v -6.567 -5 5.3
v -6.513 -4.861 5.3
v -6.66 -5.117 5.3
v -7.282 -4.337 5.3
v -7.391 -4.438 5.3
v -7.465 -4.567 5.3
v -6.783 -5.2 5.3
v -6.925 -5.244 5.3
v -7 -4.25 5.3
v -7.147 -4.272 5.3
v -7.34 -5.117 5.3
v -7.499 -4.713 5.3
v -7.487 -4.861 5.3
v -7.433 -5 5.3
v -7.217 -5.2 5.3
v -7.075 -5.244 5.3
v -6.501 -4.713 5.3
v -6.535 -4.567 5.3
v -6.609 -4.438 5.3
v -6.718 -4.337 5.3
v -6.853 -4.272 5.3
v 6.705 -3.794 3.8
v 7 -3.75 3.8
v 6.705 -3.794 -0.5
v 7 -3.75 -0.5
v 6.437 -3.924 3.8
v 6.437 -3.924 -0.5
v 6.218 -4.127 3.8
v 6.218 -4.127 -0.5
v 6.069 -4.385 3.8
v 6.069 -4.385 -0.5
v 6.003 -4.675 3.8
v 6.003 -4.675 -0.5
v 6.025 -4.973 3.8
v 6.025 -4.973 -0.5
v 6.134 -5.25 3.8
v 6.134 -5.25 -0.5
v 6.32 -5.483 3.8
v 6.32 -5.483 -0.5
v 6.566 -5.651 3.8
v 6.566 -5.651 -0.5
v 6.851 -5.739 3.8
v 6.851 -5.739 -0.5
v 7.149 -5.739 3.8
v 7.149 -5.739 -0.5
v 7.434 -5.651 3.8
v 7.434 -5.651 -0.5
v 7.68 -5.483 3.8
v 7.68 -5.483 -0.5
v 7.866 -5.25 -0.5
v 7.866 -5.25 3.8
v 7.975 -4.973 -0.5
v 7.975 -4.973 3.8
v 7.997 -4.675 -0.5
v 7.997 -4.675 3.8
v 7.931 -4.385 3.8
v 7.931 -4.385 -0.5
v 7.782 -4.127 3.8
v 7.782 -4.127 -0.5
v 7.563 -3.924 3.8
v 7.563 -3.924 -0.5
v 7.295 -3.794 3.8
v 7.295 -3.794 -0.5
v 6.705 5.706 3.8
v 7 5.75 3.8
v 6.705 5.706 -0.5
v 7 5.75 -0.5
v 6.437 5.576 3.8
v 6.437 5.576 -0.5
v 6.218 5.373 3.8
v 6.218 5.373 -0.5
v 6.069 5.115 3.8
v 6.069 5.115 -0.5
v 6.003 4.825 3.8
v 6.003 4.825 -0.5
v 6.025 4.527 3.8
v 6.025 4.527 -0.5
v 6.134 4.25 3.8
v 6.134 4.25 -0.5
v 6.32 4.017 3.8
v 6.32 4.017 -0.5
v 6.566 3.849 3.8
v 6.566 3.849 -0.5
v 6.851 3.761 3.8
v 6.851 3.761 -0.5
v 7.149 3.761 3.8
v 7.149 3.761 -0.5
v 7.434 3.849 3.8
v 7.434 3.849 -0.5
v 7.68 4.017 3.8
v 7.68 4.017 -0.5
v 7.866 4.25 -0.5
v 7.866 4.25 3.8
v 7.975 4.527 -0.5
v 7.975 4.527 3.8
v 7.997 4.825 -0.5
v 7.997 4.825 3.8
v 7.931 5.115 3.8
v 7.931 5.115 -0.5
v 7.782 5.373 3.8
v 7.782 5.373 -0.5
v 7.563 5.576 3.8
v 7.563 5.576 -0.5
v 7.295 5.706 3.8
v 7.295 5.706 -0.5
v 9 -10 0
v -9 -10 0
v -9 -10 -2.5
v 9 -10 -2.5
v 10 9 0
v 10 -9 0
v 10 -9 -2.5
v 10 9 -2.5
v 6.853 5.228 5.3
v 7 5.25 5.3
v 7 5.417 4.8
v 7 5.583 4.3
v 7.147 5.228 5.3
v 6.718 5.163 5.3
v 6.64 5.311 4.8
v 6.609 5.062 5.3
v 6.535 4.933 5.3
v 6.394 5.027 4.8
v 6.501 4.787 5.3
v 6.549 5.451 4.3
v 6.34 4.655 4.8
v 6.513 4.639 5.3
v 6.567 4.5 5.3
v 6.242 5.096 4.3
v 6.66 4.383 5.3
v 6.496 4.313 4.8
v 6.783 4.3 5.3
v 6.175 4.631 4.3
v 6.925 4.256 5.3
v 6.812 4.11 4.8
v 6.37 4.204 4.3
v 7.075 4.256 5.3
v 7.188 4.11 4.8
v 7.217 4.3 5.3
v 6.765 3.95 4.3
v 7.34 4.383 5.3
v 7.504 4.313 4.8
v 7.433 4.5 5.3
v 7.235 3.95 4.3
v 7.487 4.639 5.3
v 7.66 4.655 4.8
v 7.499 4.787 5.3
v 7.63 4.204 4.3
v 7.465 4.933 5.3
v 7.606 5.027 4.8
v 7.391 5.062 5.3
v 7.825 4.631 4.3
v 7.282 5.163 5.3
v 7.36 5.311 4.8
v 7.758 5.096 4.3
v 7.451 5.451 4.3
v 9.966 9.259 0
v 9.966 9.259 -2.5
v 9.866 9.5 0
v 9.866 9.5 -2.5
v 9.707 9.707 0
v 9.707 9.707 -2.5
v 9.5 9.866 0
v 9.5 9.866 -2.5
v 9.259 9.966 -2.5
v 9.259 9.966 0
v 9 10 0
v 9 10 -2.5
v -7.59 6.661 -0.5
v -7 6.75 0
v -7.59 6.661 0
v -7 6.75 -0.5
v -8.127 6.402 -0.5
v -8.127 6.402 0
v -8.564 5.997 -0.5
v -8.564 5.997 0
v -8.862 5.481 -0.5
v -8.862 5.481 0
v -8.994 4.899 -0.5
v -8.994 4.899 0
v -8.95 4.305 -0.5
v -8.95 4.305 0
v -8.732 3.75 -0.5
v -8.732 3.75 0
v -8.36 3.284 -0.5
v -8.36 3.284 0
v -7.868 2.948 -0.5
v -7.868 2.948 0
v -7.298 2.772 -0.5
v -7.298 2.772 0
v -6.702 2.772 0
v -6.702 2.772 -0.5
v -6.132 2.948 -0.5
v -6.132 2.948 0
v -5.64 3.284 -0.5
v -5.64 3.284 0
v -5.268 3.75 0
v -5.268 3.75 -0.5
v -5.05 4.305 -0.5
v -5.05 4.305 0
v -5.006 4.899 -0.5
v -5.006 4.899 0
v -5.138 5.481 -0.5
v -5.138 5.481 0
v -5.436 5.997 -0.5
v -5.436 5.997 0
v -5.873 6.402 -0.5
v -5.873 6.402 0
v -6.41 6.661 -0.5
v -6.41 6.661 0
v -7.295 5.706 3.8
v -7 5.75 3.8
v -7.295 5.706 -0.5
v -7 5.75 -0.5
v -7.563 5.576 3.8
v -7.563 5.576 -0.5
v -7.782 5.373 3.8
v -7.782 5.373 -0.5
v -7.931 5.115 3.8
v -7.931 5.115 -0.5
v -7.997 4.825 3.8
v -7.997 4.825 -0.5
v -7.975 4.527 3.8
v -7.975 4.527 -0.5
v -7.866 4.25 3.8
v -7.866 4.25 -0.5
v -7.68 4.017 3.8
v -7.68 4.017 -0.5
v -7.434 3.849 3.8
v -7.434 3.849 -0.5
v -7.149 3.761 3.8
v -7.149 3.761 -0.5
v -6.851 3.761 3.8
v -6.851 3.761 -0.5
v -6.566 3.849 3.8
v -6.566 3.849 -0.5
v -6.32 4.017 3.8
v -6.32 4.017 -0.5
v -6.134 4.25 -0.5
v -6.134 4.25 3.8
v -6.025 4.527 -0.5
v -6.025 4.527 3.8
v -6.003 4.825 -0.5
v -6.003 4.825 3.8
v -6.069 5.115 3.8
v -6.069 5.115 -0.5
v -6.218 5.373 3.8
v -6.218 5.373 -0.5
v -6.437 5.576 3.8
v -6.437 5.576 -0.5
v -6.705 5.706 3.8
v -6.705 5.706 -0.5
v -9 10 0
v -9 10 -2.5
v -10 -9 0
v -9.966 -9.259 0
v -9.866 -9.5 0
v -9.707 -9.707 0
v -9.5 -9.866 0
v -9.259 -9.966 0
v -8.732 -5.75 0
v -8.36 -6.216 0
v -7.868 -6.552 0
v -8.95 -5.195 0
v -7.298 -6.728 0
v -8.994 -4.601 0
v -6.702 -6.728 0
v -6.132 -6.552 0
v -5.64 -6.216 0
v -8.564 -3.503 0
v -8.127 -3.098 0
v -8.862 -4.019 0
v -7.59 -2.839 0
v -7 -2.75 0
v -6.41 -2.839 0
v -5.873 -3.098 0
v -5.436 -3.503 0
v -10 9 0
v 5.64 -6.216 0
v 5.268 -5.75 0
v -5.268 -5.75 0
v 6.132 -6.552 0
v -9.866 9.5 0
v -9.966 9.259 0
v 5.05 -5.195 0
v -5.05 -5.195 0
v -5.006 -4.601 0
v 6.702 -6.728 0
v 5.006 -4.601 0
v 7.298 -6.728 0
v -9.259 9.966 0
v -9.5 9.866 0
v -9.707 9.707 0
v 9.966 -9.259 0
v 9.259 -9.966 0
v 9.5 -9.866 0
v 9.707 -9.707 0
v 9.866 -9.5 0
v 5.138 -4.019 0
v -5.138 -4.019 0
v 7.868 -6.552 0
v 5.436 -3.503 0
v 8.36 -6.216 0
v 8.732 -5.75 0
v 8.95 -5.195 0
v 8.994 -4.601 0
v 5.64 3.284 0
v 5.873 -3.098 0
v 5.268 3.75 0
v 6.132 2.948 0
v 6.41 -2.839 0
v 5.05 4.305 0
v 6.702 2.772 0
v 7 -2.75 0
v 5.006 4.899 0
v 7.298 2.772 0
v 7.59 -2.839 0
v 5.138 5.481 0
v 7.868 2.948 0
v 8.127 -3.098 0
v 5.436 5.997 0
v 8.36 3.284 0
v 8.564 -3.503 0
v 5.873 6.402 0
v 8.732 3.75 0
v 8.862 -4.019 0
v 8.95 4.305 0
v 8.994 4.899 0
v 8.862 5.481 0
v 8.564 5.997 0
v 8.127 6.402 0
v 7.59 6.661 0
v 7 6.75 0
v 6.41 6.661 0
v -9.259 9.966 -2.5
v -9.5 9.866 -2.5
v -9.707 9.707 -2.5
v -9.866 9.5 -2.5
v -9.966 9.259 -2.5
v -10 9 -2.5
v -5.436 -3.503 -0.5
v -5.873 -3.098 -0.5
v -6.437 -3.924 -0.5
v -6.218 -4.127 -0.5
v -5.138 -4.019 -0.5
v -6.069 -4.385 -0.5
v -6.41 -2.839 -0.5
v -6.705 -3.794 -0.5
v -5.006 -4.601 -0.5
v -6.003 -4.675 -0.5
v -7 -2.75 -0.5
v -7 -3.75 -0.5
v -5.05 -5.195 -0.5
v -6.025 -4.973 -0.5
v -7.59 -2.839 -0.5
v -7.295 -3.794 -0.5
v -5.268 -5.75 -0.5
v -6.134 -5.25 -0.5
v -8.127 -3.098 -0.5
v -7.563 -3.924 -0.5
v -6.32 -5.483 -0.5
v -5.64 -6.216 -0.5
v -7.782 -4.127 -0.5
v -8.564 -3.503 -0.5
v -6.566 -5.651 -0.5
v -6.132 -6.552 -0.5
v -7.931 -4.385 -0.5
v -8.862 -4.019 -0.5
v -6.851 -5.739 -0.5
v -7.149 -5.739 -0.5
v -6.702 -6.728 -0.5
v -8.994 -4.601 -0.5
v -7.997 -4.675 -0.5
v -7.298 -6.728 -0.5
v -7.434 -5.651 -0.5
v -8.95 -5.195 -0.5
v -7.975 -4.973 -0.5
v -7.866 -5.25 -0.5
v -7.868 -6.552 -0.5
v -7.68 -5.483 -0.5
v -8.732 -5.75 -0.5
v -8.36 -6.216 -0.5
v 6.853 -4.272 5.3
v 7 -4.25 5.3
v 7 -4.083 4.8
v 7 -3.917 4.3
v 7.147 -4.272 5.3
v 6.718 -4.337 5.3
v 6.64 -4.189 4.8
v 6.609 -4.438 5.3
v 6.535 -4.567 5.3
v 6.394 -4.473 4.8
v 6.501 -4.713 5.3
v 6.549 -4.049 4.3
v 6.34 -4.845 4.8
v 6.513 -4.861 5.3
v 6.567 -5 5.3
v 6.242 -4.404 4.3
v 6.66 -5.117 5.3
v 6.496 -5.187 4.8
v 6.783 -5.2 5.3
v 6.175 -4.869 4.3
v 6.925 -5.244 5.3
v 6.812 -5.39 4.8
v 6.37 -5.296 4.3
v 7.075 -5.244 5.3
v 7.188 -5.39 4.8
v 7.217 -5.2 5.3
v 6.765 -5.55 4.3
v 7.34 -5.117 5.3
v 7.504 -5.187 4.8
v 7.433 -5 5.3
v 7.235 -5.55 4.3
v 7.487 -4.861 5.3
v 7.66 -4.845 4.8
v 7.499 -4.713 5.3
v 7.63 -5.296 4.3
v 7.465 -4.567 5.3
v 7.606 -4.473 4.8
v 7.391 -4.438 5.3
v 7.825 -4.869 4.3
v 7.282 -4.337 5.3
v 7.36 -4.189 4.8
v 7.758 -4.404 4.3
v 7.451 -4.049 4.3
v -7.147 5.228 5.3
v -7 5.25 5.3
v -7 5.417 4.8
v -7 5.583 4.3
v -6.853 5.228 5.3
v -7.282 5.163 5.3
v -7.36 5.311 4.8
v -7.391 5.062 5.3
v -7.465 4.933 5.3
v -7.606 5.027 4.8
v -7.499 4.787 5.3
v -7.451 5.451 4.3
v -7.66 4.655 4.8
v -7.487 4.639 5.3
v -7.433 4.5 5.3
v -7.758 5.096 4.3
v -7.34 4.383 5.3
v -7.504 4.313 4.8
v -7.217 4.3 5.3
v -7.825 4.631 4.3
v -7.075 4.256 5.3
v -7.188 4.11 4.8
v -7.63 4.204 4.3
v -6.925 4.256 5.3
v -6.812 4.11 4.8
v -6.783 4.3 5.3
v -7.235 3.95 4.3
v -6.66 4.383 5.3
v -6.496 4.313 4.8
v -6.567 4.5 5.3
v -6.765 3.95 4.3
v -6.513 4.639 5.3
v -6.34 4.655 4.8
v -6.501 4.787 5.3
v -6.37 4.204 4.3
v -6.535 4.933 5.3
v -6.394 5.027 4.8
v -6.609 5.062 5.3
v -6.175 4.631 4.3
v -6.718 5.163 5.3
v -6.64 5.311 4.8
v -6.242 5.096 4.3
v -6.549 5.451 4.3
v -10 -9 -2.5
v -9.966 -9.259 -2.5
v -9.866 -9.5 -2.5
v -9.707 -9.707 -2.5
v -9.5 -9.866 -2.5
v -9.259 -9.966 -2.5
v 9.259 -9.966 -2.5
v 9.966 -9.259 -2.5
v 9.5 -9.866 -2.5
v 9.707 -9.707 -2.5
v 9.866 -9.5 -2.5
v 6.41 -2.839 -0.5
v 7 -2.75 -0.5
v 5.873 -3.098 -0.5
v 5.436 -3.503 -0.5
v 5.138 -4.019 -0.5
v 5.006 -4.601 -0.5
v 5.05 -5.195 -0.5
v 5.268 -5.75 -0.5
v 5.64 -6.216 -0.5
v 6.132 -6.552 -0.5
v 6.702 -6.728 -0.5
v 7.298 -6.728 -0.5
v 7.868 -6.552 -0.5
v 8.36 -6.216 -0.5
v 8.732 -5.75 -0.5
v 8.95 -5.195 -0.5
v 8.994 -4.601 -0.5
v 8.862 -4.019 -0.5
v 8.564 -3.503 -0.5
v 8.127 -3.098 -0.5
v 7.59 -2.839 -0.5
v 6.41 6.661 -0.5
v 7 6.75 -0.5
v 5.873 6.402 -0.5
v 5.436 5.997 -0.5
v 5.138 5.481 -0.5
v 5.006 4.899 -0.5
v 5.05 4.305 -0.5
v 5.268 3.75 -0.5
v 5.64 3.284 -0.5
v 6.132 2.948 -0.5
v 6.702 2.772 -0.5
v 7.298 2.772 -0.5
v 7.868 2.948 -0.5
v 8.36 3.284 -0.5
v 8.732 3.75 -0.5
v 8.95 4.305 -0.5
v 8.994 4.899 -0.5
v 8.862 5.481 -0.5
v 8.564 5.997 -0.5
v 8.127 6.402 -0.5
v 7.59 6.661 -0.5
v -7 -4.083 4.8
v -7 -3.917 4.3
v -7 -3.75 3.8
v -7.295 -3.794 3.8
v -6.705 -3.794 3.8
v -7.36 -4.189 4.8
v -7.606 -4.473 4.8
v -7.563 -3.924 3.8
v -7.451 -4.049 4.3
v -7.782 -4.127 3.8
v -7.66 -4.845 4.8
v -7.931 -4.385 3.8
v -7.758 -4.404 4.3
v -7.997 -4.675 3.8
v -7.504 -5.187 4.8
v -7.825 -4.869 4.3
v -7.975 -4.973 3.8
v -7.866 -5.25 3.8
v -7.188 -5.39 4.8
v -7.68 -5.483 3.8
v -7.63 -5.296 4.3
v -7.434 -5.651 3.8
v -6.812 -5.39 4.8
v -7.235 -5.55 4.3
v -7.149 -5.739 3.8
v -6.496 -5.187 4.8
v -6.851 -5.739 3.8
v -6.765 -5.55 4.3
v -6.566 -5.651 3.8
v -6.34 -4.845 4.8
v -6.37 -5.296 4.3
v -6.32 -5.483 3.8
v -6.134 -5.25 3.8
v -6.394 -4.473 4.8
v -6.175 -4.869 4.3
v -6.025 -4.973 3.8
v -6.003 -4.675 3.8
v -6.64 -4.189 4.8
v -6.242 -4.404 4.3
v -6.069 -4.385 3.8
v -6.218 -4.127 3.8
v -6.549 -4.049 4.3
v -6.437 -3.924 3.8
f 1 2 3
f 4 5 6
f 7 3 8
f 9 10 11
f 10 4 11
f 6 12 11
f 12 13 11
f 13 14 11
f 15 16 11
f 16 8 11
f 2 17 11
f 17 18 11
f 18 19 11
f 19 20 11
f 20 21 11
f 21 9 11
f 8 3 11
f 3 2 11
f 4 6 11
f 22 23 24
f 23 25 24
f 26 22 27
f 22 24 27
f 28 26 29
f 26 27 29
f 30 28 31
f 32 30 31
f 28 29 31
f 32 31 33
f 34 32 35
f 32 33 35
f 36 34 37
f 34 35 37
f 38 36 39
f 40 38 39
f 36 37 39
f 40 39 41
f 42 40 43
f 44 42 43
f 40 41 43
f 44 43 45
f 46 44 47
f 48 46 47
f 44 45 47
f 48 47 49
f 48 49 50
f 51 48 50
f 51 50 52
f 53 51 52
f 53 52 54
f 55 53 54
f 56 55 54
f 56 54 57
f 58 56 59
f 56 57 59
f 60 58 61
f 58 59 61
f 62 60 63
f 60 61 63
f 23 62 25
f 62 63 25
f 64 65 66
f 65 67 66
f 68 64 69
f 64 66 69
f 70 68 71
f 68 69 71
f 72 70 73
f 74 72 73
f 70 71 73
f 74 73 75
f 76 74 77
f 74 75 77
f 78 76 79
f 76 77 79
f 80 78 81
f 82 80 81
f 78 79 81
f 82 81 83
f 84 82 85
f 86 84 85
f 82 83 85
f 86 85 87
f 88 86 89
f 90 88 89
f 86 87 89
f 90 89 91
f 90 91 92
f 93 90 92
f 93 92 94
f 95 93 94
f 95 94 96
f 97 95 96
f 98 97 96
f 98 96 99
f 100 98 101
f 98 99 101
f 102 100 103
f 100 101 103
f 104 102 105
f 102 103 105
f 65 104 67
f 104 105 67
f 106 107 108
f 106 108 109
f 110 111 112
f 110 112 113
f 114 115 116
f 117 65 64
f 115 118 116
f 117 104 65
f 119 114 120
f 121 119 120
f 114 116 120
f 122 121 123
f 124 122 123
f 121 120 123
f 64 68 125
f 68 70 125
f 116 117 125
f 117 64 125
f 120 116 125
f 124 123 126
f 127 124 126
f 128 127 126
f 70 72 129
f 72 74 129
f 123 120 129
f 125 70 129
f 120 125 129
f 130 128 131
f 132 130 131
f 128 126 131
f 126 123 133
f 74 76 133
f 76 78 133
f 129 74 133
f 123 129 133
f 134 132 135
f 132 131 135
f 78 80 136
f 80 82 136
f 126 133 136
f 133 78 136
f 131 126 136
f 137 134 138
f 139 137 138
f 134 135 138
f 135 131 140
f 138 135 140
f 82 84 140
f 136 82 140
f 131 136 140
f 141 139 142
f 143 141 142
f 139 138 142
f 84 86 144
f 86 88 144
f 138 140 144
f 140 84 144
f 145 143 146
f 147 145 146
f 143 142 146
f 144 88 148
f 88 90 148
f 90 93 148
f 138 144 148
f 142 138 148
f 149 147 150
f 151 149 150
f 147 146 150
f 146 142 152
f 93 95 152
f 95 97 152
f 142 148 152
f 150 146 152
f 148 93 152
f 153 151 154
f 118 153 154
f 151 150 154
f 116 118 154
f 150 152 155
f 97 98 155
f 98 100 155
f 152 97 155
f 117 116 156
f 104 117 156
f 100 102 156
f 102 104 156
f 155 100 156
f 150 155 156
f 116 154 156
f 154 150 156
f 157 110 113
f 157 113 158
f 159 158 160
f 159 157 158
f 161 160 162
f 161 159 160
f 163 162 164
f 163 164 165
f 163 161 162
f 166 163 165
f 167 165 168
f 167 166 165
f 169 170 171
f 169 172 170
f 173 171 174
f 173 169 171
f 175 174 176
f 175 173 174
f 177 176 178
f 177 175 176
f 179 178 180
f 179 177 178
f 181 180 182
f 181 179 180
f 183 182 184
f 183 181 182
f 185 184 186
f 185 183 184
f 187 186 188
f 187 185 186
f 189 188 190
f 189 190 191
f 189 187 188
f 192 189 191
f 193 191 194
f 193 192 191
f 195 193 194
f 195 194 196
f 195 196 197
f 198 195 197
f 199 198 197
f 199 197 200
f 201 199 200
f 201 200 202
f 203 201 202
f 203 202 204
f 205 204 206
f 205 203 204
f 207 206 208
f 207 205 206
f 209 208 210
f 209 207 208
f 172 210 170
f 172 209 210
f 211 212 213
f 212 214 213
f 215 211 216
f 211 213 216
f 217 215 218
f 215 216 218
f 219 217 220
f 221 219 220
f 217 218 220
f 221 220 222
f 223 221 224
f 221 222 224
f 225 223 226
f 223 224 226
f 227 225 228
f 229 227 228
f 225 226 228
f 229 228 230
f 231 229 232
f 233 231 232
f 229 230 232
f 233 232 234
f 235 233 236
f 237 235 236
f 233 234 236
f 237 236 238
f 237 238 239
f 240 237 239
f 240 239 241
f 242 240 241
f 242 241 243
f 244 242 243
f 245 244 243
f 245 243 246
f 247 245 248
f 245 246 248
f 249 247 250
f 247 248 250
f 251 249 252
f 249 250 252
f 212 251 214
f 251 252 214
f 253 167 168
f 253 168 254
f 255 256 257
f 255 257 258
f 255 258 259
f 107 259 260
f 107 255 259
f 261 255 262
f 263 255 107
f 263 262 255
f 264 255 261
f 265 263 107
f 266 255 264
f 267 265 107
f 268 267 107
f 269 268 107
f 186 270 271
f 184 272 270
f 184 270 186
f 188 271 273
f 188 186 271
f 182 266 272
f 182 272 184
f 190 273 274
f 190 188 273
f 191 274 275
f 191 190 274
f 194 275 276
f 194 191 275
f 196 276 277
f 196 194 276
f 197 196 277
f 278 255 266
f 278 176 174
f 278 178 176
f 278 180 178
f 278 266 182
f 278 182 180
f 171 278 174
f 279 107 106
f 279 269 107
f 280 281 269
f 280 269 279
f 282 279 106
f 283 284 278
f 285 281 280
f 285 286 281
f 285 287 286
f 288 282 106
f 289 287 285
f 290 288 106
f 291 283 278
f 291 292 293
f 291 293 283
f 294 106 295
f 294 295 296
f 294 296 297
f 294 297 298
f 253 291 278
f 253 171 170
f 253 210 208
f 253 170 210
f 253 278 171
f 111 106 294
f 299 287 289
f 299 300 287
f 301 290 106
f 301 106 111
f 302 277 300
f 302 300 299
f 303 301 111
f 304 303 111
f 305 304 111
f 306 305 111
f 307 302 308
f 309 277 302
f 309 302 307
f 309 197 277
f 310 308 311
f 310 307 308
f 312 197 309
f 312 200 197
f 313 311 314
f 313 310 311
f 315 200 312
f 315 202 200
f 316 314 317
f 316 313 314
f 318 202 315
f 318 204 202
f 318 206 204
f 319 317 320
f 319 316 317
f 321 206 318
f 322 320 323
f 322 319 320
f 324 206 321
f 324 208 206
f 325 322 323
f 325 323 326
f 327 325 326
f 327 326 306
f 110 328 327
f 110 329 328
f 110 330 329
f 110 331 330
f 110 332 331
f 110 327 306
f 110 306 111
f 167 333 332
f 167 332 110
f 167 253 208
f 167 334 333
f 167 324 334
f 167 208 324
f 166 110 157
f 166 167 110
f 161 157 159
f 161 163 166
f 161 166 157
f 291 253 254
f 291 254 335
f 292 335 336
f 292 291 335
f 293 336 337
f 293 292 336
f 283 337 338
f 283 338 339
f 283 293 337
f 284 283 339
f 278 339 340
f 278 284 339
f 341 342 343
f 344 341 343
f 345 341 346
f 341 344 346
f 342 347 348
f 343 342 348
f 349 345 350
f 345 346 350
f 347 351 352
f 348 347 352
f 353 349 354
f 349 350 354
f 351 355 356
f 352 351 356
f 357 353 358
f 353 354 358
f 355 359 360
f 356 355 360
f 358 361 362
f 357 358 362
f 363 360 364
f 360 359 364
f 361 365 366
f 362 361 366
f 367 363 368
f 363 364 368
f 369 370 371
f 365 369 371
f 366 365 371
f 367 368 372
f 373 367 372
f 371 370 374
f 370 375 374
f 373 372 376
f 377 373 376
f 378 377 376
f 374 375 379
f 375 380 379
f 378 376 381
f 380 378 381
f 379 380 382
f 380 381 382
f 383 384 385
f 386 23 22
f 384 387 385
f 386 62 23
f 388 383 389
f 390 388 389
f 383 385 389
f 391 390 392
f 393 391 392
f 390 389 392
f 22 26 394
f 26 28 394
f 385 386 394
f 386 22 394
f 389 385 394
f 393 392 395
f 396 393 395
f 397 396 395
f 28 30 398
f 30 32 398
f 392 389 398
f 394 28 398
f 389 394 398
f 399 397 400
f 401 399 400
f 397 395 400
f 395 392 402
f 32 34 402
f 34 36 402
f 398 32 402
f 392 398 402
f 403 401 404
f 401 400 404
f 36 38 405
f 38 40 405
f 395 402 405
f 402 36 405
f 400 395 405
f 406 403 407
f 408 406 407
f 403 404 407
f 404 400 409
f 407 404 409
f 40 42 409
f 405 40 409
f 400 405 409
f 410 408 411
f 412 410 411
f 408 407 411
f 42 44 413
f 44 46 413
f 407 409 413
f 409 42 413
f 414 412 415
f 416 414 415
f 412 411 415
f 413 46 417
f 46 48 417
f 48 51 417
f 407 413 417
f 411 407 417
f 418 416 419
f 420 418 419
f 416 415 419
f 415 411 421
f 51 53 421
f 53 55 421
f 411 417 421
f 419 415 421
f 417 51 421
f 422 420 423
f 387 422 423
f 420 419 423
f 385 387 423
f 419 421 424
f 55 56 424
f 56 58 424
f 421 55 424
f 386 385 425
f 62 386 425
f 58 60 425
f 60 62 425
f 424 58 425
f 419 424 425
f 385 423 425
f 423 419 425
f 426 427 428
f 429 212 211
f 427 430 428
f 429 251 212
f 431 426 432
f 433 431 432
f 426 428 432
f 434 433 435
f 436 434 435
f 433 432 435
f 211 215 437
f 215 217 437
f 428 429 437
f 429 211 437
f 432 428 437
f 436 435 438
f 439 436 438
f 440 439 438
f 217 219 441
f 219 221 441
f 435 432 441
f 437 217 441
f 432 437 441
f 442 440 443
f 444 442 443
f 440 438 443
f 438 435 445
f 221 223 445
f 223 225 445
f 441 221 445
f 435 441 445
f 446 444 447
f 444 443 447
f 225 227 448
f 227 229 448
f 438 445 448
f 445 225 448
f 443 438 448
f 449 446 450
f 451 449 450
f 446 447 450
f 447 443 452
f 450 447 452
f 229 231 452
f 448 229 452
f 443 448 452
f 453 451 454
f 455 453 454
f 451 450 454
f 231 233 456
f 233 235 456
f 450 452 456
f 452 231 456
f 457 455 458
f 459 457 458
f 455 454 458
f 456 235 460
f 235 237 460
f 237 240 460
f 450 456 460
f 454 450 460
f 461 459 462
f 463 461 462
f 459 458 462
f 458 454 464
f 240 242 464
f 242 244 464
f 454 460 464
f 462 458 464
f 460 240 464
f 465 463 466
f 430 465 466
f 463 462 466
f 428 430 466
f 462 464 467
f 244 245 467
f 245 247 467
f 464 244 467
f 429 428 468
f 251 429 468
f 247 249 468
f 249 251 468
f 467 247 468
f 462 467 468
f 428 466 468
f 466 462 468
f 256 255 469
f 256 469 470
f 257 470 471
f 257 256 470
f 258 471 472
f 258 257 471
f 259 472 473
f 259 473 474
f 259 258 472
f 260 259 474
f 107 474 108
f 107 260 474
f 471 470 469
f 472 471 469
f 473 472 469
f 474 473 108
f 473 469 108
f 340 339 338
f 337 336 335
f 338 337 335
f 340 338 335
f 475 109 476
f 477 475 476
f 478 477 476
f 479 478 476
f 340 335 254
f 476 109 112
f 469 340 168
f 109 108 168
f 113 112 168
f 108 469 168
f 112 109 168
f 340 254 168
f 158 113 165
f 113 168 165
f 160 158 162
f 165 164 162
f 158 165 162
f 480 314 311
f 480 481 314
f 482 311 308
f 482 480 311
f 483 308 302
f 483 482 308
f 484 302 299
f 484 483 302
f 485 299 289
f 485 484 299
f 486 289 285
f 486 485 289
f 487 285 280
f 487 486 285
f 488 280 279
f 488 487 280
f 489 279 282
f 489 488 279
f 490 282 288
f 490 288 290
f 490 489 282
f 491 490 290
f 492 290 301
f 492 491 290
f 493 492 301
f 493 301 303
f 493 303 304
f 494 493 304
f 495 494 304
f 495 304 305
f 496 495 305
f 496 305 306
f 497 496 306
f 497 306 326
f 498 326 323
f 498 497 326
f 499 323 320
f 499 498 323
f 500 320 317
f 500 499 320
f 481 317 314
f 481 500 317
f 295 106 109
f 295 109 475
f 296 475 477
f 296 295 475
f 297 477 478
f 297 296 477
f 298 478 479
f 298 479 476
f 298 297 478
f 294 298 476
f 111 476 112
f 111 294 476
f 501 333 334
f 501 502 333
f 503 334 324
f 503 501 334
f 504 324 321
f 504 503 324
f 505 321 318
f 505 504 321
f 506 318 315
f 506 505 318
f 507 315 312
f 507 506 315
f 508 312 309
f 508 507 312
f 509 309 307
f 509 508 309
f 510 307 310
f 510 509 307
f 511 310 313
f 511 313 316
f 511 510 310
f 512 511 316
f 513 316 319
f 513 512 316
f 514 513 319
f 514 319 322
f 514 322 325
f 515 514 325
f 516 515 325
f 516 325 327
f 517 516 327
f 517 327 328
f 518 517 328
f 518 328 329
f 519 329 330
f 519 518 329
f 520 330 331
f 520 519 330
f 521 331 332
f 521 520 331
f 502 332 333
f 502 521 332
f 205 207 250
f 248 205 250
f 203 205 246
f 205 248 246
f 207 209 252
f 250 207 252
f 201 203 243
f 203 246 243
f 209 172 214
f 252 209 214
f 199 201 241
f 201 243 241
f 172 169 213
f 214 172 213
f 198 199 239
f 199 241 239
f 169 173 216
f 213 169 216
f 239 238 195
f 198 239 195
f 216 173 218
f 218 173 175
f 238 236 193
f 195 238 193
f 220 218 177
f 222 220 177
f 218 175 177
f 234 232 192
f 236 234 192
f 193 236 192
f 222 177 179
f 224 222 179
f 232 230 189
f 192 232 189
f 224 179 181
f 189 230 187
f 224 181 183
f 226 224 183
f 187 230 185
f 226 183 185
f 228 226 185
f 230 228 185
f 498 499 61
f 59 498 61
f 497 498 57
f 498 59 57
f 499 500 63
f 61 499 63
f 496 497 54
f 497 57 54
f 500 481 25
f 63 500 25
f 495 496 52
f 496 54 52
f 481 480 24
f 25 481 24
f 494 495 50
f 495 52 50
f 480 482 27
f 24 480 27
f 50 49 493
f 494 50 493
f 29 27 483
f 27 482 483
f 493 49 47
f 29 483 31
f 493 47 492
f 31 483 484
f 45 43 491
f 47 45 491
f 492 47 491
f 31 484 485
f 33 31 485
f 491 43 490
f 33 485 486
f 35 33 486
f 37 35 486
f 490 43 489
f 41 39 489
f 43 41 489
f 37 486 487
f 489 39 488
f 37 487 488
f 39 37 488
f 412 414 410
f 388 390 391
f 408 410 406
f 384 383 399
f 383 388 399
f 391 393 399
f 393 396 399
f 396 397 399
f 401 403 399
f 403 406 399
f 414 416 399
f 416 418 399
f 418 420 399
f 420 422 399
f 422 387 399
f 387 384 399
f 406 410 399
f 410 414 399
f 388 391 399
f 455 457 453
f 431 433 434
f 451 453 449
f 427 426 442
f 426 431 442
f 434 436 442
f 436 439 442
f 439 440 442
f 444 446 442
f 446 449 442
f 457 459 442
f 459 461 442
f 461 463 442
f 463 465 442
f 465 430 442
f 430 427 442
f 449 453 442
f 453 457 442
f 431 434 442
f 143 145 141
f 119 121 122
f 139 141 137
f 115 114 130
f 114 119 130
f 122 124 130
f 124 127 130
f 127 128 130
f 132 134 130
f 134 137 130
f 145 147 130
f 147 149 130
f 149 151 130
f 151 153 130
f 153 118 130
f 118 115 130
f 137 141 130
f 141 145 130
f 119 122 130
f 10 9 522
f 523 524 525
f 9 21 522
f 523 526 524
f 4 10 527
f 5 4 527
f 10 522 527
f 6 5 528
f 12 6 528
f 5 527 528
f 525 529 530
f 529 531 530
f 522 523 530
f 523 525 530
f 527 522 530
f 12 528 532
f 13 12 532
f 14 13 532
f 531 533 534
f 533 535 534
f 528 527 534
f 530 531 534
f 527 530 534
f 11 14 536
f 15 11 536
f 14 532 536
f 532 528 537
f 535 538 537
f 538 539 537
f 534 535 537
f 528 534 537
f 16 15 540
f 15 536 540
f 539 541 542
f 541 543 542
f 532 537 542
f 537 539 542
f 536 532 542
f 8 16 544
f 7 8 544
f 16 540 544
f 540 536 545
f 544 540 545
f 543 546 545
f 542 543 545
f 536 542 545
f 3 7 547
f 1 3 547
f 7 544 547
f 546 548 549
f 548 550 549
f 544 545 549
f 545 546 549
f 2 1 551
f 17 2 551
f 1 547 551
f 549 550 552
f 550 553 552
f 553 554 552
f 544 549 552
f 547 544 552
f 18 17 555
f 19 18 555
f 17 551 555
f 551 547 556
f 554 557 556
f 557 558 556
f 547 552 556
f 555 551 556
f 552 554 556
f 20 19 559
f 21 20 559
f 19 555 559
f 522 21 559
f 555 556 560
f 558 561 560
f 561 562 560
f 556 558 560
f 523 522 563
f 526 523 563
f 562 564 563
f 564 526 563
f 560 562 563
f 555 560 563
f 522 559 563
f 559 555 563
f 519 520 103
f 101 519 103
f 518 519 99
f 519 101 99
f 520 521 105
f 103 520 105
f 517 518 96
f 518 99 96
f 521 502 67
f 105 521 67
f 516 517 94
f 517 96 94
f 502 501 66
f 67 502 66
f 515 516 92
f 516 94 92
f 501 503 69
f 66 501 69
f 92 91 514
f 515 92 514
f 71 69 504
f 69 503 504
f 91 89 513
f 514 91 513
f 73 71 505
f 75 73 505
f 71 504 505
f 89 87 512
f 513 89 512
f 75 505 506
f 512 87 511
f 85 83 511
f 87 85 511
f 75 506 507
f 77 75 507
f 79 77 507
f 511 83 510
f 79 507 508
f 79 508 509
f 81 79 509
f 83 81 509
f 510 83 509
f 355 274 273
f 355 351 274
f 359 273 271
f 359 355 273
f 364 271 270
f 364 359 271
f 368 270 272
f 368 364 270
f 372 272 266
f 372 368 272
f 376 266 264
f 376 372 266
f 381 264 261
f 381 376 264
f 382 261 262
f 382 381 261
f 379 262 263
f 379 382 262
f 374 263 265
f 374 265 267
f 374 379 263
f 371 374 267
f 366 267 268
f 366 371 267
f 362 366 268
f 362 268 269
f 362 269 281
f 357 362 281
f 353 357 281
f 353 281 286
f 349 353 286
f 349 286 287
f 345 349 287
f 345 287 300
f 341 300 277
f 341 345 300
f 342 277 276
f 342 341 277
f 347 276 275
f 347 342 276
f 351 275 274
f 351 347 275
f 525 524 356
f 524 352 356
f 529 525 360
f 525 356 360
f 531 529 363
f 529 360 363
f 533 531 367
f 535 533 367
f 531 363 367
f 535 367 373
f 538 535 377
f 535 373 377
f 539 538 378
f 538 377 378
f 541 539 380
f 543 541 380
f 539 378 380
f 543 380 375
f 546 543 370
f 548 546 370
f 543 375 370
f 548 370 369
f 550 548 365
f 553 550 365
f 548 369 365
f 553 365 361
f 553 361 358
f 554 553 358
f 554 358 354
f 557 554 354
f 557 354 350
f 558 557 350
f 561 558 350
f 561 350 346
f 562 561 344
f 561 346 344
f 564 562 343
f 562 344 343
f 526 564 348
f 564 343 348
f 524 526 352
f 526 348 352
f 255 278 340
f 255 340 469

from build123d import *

# Parameters (mm, degrees)
BOSS_EXTRUDE1_DEPTH = 2.5
SKETCH2_W           = 0.5
SKETCH2_H           = 2
SKETCH3_W           = 0.5
SKETCH3_H           = 2
SKETCH4_W           = 0.5
SKETCH4_H           = 2
SKETCH5_W           = 0.5
SKETCH5_H           = 2


with BuildPart() as part:
    # Sketch1 → Boss-Extrude1 (new body)
    with BuildSketch(Plane.XY):
        with BuildLine():
            Line((-10, 9), (-10, -9))
            ThreePointArc((-10, -9), (-9.707106781, -9.707106781), (-9, -10))
            Line((-9, -10), (9, -10))
            ThreePointArc((9, -10), (9.707106781, -9.707106781), (10, -9))
            Line((10, -9), (10, 9))
            ThreePointArc((10, 9), (9.707106781, 9.707106781), (9, 10))
            Line((9, 10), (-9, 10))
            ThreePointArc((-9, 10), (-9.707106781, 9.707106781), (-10, 9))
        make_face()
    extrude(amount=-BOSS_EXTRUDE1_DEPTH)

    # Sketch2 → Cut-Revolve1 (revolve, cut)
    with BuildSketch(Plane(origin=(-7, 0, 0), x_dir=(0, 0, -1), z_dir=(1, 0, 0))):
        with Locations((0.25, 5.75)):
            Rectangle(SKETCH2_W, SKETCH2_H)
    revolve(axis=Axis((-7, 4.75, -0.5), (0, 0, 1)), mode=Mode.SUBTRACT)

    # Sketch3 → Cut-Revolve2 (revolve, cut)
    with BuildSketch(Plane(origin=(7, 0, 0), x_dir=(0, 0, -1), z_dir=(1, 0, 0))):
        with Locations((0.25, 5.75)):
            Rectangle(SKETCH3_W, SKETCH3_H)
    revolve(axis=Axis((7, 4.75, -0.5), (0, 0, 1)), mode=Mode.SUBTRACT)

    # Sketch4 → Cut-Revolve3 (revolve, cut)
    with BuildSketch(Plane(origin=(7, 0, 0), x_dir=(0, 0, -1), z_dir=(1, 0, 0))):
        with Locations((0.25, -3.75)):
            Rectangle(SKETCH4_W, SKETCH4_H)
    revolve(axis=Axis((7, -4.75, -0.5), (0, 0, 1)), mode=Mode.SUBTRACT)

    # Sketch5 → Cut-Revolve4 (revolve, cut)
    with BuildSketch(Plane(origin=(-7, 0, 0), x_dir=(0, 0, -1), z_dir=(1, 0, 0))):
        with Locations((0.25, -3.75)):
            Rectangle(SKETCH5_W, SKETCH5_H)
    revolve(axis=Axis((-7, -4.75, -0.5), (0, 0, 1)), mode=Mode.SUBTRACT)

    # Sketch6 → Revolve1 (revolve)
    with BuildSketch(Plane(origin=(-7, 0, 0), x_dir=(0, 0, -1), z_dir=(1, 0, 0))):
        Polygon((-5.3, 4.75), (-5.3, 5.25), (-3.8, 5.75), (0.5, 5.75), (0.5, 4.75), align=None)
    revolve(axis=Axis((-7, 4.75, -0.5), (0, 0, 1)))

    # Sketch7 → Revolve2 (revolve)
    with BuildSketch(Plane(origin=(7, 0, 0), x_dir=(0, 0, -1), z_dir=(1, 0, 0))):
        Polygon((-5.3, 4.75), (-5.3, 5.25), (-3.8, 5.75), (0.5, 5.75), (0.5, 4.75), align=None)
    revolve(axis=Axis((7, 4.75, -0.5), (0, 0, 1)))

    # Sketch8 → Revolve3 (revolve)
    with BuildSketch(Plane(origin=(7, 0, 0), x_dir=(0, 0, -1), z_dir=(1, 0, 0))):
        Polygon((-5.3, -4.75), (-5.3, -4.25), (-3.8, -3.75), (0.5, -3.75), (0.5, -4.75), align=None)
    revolve(axis=Axis((7, -4.75, -0.5), (0, 0, 1)))

    # Sketch9 → Revolve4 (revolve)
    with BuildSketch(Plane(origin=(-7, 0, 0), x_dir=(0, 0, -1), z_dir=(1, 0, 0))):
        Polygon((-5.3, -4.75), (-5.3, -4.25), (-3.8, -3.75), (0.5, -3.75), (0.5, -4.75), align=None)
    revolve(axis=Axis((-7, -4.75, -0.5), (0, 0, 1)))


solid = part.part
